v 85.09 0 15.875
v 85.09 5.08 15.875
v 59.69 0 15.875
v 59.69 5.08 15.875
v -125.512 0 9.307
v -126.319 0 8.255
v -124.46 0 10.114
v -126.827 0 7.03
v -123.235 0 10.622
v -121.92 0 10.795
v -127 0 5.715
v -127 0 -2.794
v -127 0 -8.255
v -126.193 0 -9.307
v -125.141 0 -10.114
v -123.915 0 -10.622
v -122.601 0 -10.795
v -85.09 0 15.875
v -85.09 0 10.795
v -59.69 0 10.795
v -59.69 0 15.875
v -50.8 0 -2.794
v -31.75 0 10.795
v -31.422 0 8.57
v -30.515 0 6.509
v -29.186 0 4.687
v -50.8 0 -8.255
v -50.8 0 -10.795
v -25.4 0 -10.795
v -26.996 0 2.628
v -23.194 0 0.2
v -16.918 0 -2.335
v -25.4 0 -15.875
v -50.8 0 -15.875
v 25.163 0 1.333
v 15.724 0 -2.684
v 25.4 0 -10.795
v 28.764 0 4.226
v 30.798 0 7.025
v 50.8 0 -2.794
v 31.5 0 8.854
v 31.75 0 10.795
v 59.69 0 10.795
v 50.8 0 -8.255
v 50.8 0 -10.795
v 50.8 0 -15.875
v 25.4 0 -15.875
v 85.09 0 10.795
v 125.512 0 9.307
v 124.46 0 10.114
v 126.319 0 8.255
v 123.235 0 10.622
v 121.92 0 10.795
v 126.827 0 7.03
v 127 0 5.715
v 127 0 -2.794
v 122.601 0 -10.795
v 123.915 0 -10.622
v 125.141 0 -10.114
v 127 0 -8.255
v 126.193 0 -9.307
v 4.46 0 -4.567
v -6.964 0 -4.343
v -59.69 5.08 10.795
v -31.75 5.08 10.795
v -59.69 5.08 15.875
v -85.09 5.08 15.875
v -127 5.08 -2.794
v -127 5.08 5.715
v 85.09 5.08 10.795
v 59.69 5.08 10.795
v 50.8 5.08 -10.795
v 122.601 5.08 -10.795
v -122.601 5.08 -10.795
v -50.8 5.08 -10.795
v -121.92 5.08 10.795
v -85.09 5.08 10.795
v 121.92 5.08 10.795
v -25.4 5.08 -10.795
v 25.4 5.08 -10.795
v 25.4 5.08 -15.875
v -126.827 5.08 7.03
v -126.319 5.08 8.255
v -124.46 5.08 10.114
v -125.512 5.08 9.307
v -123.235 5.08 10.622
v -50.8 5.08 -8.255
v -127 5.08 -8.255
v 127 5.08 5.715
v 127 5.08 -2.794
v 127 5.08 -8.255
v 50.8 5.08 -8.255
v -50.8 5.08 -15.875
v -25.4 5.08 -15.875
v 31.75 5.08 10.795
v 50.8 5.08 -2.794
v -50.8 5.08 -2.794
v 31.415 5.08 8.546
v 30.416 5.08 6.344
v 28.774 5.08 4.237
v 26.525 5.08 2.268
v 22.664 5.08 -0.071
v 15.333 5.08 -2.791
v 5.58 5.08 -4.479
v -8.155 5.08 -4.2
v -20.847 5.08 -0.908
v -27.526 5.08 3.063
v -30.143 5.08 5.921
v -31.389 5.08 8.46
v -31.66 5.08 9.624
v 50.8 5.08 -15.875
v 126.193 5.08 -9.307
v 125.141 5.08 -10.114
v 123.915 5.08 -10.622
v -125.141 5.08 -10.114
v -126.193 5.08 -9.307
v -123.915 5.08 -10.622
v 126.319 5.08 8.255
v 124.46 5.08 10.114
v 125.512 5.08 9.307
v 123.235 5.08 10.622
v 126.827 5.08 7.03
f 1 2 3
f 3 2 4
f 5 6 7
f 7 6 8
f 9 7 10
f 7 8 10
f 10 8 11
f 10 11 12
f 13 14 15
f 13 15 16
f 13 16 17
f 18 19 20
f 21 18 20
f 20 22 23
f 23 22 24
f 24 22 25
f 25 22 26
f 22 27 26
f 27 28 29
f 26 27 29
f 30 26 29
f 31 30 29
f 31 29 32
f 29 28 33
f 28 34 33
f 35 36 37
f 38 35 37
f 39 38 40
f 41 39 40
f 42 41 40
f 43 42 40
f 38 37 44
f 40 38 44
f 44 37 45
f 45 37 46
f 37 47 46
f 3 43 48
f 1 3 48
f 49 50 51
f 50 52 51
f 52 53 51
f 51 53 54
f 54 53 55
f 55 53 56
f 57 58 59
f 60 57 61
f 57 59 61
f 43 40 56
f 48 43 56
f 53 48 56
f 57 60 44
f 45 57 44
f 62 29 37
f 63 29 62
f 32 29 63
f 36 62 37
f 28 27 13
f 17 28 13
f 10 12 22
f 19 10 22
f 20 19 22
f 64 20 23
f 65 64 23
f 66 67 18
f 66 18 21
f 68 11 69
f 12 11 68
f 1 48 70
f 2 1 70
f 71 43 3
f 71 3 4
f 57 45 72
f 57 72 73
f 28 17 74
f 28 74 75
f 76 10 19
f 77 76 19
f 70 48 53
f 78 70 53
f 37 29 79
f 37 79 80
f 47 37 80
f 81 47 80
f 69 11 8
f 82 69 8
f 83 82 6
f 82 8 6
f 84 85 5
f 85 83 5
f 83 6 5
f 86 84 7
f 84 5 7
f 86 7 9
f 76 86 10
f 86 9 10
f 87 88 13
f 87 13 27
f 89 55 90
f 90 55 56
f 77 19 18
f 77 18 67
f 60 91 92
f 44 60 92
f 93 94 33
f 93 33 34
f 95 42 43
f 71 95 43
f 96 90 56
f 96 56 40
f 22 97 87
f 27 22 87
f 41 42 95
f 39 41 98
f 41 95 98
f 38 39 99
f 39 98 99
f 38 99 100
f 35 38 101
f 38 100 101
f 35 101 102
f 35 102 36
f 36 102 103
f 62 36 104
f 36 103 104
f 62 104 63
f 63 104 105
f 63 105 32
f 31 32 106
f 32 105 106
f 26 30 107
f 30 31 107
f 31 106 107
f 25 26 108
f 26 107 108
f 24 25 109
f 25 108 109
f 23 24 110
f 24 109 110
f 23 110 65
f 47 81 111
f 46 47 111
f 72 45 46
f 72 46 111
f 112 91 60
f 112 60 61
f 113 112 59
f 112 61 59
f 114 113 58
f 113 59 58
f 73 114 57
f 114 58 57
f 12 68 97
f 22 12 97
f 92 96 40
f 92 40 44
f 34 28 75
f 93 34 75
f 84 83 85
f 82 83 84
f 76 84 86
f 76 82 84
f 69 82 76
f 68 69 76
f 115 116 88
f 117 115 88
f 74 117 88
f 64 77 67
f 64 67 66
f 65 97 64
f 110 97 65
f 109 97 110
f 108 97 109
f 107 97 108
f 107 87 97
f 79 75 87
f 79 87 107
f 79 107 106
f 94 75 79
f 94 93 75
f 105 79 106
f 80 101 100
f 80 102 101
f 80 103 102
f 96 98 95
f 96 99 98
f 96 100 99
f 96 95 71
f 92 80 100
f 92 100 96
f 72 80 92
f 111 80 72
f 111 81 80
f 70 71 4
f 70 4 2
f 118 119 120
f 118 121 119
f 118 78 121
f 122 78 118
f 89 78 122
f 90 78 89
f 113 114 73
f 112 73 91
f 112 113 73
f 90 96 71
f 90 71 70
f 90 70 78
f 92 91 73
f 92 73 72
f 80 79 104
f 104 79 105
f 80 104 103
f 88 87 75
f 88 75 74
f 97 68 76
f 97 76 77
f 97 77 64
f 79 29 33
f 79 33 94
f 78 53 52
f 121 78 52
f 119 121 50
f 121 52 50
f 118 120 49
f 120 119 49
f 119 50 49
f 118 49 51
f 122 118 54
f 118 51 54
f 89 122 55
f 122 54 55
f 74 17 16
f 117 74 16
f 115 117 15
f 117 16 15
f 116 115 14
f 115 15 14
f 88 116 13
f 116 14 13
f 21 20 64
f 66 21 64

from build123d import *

# Parameters (mm, degrees)
SKETCH1_W            = 254
SKETCH1_H            = 21.59
WALL_BASE_DEPTH      = 5.08
SKETCH2_W            = 25.4
SKETCH2_H            = 5.08
TAB_DEPTH            = 5.08
SKETCH7_W            = 25.4
SKETCH7_H            = 5.08
BOSS_EXTRUDE1_DEPTH  = 5.08
SKETCH3_RX           = 31.75
SKETCH3_RY           = 15.515530829
WHEEL_WELL_CUT_DEPTH = 129.089117512
SKETCH6_W            = 76.2
SKETCH6_H            = 5.461
CUT_EXTRUDE5_DEPTH   = 129.089117627
FILLET2_R            = 5.08


with BuildPart() as part:
    # Sketch1 → Wall-Base (new body)
    with BuildSketch(Plane(origin=(0, 0, 0), x_dir=(1, 0, 0), z_dir=(0, 1, 0))):
        Rectangle(SKETCH1_W, SKETCH1_H)
    extrude(amount=WALL_BASE_DEPTH)

    # Sketch2 → Tab (add)
    with BuildSketch(Plane(origin=(0, 0, -10.795), x_dir=(-1, 0, 0), z_dir=(0, 0, -1))):
        with Locations((38.1, 2.54)):
            Rectangle(SKETCH2_W, SKETCH2_H)
    tab = extrude(amount=TAB_DEPTH)

    # Sketch7 → Boss-Extrude1 (add)
    with BuildSketch(Plane.XY.offset(10.795)):
        with Locations((-72.39, 2.54)):
            Rectangle(SKETCH7_W, SKETCH7_H)
    boss_extrude1 = extrude(amount=BOSS_EXTRUDE1_DEPTH)

    # Mirror1: Tab across plane
    add(tab.mirror(Plane.ZY))

    # Sketch3 → Wheel-Well-Cut (cut, through all)
    with BuildSketch(Plane(origin=(0, 5.08, 0), x_dir=(1, 0, 0), z_dir=(0, 1, 0))):
        with Locations(Location((0, -10.795), (0, 0, 0))):
            Ellipse(SKETCH3_RX, SKETCH3_RY)
    extrude(amount=-WHEEL_WELL_CUT_DEPTH, mode=Mode.SUBTRACT)

    # Sketch6 → Cut-Extrude5 (cut, through all)
    with BuildSketch(Plane(origin=(0, 5.08, 0), x_dir=(1, 0, 0), z_dir=(0, 1, 0))):
        with Locations((-88.9, 5.5245)):
            Rectangle(SKETCH6_W, SKETCH6_H)
    cut_extrude5 = extrude(amount=-CUT_EXTRUDE5_DEPTH, mode=Mode.SUBTRACT)

    # Mirror4: Cut-Extrude5 across plane
    add(cut_extrude5.mirror(Plane.ZY), mode=Mode.SUBTRACT)

    # Fillet2
    # the kernel refuses this fillet: 5.08 mm, written as the material it takes off along each edge
    with BuildSketch(Plane(origin=(127, -12.7, 10.795), x_dir=(0, 0, -1), z_dir=(0, 1, 0)), Plane(origin=(-127, -12.7, 10.795), x_dir=(1, 0, 0), z_dir=(0, 1, 0))) as fillet2_piece_1:
        with BuildLine():
            CenterArc((FILLET2_R, FILLET2_R), FILLET2_R, 180, 90)
            Line((0, FILLET2_R), (-FILLET2_R * 0.02, FILLET2_R))
            Line((-FILLET2_R * 0.02, FILLET2_R), (-FILLET2_R * 0.02, -FILLET2_R * 0.02))
            Line((-FILLET2_R * 0.02, -FILLET2_R * 0.02), (FILLET2_R, -FILLET2_R * 0.02))
            Line((FILLET2_R, -FILLET2_R * 0.02), (FILLET2_R, 0))
        make_face()
    extrude(amount=30.48, mode=Mode.SUBTRACT)
    with BuildSketch(Plane(origin=(-127, -10.998522628, -10.795), x_dir=(0, 0, 1), z_dir=(0, 1, 0))) as fillet2_piece_2:
        with BuildLine():
            CenterArc((5.08, 4.399409051), FILLET2_R, 180, 60)
            Line((0, 4.399409051), (-0.1016, 4.399409051))
            Line((-0.1016, 4.399409051), (-0.1016, 0))
            Line((-0.1016, 0), (0, -0.1016))
            ThreePointArc((0, -0.1016), (1.27, -0.1016), (2.4892, -0.087988181))
            Line((2.4892, -0.087988181), (2.54, 0))
        make_face()
    extrude(amount=27.077045256, mode=Mode.SUBTRACT)
    with BuildSketch(Plane(origin=(127, -10.998522628, -10.795), x_dir=(-1, 0, 0), z_dir=(0, 1, 0))) as fillet2_piece_3:
        with BuildLine():
            CenterArc((4.399409051, 5.08), FILLET2_R, 210, 60)
            Line((0, 2.54), (-0.087988181, 2.4892))
            ThreePointArc((-0.087988181, 2.4892), (-0.1016, 1.27), (-0.1016, 0))
            Line((-0.1016, 0), (0, -0.1016))
            Line((0, -0.1016), (4.399409051, -0.1016))
            Line((4.399409051, -0.1016), (4.399409051, 0))
        make_face()
    extrude(amount=27.077045256, mode=Mode.SUBTRACT)

    # Mirror5: Boss-Extrude1 across plane
    add(boss_extrude1.mirror(Plane.ZY))


solid = part.part
